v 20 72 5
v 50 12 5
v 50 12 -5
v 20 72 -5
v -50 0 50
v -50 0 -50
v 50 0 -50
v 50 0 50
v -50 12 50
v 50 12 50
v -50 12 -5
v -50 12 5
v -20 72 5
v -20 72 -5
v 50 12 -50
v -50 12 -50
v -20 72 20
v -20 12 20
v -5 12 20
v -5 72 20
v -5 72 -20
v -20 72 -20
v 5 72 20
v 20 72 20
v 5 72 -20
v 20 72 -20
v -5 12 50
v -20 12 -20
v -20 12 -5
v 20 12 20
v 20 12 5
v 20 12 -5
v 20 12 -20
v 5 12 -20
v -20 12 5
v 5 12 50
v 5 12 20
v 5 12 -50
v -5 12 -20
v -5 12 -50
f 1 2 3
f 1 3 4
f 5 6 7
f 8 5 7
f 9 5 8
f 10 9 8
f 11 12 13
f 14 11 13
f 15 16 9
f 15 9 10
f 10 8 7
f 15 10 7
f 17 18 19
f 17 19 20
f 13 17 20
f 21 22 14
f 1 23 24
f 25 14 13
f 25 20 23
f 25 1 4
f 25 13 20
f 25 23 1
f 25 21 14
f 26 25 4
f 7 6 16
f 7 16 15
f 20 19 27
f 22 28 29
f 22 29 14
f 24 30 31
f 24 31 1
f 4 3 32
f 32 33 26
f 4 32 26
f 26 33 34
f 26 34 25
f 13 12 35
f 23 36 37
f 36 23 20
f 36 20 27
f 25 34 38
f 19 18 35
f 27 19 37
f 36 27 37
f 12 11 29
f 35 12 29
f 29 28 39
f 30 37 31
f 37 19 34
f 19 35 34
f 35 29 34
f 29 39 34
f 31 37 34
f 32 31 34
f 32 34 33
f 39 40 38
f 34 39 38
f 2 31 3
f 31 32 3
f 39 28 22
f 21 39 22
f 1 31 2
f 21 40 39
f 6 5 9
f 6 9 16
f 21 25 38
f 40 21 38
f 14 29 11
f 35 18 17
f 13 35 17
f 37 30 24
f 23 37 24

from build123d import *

# Parameters (mm, degrees)
SKETCH1_W           = 100
SKETCH1_H           = 100
BOSS_EXTRUDE1_DEPTH = 12
SKETCH2_W           = 100
SKETCH2_H           = 100
BOSS_EXTRUDE2_DEPTH = 60
SKETCH4_W           = 30
SKETCH4_H           = 60
CUT_EXTRUDE1_DEPTH  = 45
SKETCH5_W           = 30
SKETCH5_H           = 60
CUT_EXTRUDE2_DEPTH  = 45
SKETCH7_W           = 30
SKETCH7_H           = 60
CUT_EXTRUDE3_DEPTH  = 45
SKETCH8_W           = 30
SKETCH8_H           = 60
CUT_EXTRUDE4_DEPTH  = 15
SKETCH9_W           = 30
SKETCH9_H           = 60
CUT_EXTRUDE5_DEPTH  = 15
CUT_EXTRUDE6_DEPTH  = 104.484298326
CUT_EXTRUDE7_DEPTH  = 104.484298326


with BuildPart() as part:
    # Sketch1 → Boss-Extrude1 (new body)
    with BuildSketch(Plane(origin=(0, 0, 0), x_dir=(1, 0, 0), z_dir=(0, 1, 0))):
        Rectangle(SKETCH1_W, SKETCH1_H)
    extrude(amount=BOSS_EXTRUDE1_DEPTH)


with BuildPart() as body_2:
    # Sketch2 → Boss-Extrude2 (new body)
    with BuildSketch(Plane(origin=(0, 12, 0), x_dir=(1, 0, 0), z_dir=(0, 1, 0))):
        Rectangle(SKETCH2_W, SKETCH2_H)
    extrude(amount=BOSS_EXTRUDE2_DEPTH)

    # Sketch4 → Cut-Extrude1 (cut)
    with BuildSketch(Plane(origin=(50, 0, 0), x_dir=(0, 0, -1), z_dir=(1, 0, 0))):
        with Locations((-35, 42)):
            Rectangle(SKETCH4_W, SKETCH4_H)
    extrude(amount=-CUT_EXTRUDE1_DEPTH, mode=Mode.SUBTRACT)

    # Sketch5 → Cut-Extrude2 (cut)
    with BuildSketch(Plane(origin=(50, 0, 0), x_dir=(0, 0, -1), z_dir=(1, 0, 0))):
        with Locations((35, 42)):
            Rectangle(SKETCH5_W, SKETCH5_H)
    extrude(amount=-CUT_EXTRUDE2_DEPTH, mode=Mode.SUBTRACT)

    # Sketch7 → Cut-Extrude3 (cut)
    with BuildSketch(Plane.ZY.offset(50)):
        with Locations((-35, 42)):
            Rectangle(SKETCH7_W, SKETCH7_H)
        with Locations((35, 42)):
            Rectangle(SKETCH7_W, SKETCH7_H)
    extrude(amount=-CUT_EXTRUDE3_DEPTH, mode=Mode.SUBTRACT)

    # Sketch8 → Cut-Extrude4 (cut)
    with BuildSketch(Plane.XY.offset(20)):
        with Locations((35, 42)):
            Rectangle(SKETCH8_W, SKETCH8_H)
        with Locations((-35, 42)):
            Rectangle(SKETCH8_W, SKETCH8_H)
    extrude(amount=-CUT_EXTRUDE4_DEPTH, mode=Mode.SUBTRACT)

    # Sketch9 → Cut-Extrude5 (cut)
    with BuildSketch(Plane(origin=(0, 0, -20), x_dir=(-1, 0, 0), z_dir=(0, 0, -1))):
        with Locations((-35, 42)):
            Rectangle(SKETCH9_W, SKETCH9_H)
        with Locations((35, 42)):
            Rectangle(SKETCH9_W, SKETCH9_H)
    extrude(amount=-CUT_EXTRUDE5_DEPTH, mode=Mode.SUBTRACT)

    # Sketch10 → Cut-Extrude6 (cut, through all)
    with BuildSketch(Plane(origin=(5, 0, 0), x_dir=(0, 0, -1), z_dir=(1, 0, 0))):
        Polygon((-50, 12), (-50, 72), (-20, 72), align=None)
        Polygon((20, 72), (50, 12), (50, 72), align=None)
    extrude(amount=-CUT_EXTRUDE6_DEPTH, mode=Mode.SUBTRACT)

    # Sketch11 → Cut-Extrude7 (cut, through all)
    with BuildSketch(Plane.XY.offset(5)):
        Polygon((20, 72), (50, 72), (50, 12), align=None)
        Polygon((-20, 72), (-50, 72), (-50, 12), align=None)
    extrude(amount=-CUT_EXTRUDE7_DEPTH, mode=Mode.SUBTRACT)


solid = Compound([part.part, body_2.part])
